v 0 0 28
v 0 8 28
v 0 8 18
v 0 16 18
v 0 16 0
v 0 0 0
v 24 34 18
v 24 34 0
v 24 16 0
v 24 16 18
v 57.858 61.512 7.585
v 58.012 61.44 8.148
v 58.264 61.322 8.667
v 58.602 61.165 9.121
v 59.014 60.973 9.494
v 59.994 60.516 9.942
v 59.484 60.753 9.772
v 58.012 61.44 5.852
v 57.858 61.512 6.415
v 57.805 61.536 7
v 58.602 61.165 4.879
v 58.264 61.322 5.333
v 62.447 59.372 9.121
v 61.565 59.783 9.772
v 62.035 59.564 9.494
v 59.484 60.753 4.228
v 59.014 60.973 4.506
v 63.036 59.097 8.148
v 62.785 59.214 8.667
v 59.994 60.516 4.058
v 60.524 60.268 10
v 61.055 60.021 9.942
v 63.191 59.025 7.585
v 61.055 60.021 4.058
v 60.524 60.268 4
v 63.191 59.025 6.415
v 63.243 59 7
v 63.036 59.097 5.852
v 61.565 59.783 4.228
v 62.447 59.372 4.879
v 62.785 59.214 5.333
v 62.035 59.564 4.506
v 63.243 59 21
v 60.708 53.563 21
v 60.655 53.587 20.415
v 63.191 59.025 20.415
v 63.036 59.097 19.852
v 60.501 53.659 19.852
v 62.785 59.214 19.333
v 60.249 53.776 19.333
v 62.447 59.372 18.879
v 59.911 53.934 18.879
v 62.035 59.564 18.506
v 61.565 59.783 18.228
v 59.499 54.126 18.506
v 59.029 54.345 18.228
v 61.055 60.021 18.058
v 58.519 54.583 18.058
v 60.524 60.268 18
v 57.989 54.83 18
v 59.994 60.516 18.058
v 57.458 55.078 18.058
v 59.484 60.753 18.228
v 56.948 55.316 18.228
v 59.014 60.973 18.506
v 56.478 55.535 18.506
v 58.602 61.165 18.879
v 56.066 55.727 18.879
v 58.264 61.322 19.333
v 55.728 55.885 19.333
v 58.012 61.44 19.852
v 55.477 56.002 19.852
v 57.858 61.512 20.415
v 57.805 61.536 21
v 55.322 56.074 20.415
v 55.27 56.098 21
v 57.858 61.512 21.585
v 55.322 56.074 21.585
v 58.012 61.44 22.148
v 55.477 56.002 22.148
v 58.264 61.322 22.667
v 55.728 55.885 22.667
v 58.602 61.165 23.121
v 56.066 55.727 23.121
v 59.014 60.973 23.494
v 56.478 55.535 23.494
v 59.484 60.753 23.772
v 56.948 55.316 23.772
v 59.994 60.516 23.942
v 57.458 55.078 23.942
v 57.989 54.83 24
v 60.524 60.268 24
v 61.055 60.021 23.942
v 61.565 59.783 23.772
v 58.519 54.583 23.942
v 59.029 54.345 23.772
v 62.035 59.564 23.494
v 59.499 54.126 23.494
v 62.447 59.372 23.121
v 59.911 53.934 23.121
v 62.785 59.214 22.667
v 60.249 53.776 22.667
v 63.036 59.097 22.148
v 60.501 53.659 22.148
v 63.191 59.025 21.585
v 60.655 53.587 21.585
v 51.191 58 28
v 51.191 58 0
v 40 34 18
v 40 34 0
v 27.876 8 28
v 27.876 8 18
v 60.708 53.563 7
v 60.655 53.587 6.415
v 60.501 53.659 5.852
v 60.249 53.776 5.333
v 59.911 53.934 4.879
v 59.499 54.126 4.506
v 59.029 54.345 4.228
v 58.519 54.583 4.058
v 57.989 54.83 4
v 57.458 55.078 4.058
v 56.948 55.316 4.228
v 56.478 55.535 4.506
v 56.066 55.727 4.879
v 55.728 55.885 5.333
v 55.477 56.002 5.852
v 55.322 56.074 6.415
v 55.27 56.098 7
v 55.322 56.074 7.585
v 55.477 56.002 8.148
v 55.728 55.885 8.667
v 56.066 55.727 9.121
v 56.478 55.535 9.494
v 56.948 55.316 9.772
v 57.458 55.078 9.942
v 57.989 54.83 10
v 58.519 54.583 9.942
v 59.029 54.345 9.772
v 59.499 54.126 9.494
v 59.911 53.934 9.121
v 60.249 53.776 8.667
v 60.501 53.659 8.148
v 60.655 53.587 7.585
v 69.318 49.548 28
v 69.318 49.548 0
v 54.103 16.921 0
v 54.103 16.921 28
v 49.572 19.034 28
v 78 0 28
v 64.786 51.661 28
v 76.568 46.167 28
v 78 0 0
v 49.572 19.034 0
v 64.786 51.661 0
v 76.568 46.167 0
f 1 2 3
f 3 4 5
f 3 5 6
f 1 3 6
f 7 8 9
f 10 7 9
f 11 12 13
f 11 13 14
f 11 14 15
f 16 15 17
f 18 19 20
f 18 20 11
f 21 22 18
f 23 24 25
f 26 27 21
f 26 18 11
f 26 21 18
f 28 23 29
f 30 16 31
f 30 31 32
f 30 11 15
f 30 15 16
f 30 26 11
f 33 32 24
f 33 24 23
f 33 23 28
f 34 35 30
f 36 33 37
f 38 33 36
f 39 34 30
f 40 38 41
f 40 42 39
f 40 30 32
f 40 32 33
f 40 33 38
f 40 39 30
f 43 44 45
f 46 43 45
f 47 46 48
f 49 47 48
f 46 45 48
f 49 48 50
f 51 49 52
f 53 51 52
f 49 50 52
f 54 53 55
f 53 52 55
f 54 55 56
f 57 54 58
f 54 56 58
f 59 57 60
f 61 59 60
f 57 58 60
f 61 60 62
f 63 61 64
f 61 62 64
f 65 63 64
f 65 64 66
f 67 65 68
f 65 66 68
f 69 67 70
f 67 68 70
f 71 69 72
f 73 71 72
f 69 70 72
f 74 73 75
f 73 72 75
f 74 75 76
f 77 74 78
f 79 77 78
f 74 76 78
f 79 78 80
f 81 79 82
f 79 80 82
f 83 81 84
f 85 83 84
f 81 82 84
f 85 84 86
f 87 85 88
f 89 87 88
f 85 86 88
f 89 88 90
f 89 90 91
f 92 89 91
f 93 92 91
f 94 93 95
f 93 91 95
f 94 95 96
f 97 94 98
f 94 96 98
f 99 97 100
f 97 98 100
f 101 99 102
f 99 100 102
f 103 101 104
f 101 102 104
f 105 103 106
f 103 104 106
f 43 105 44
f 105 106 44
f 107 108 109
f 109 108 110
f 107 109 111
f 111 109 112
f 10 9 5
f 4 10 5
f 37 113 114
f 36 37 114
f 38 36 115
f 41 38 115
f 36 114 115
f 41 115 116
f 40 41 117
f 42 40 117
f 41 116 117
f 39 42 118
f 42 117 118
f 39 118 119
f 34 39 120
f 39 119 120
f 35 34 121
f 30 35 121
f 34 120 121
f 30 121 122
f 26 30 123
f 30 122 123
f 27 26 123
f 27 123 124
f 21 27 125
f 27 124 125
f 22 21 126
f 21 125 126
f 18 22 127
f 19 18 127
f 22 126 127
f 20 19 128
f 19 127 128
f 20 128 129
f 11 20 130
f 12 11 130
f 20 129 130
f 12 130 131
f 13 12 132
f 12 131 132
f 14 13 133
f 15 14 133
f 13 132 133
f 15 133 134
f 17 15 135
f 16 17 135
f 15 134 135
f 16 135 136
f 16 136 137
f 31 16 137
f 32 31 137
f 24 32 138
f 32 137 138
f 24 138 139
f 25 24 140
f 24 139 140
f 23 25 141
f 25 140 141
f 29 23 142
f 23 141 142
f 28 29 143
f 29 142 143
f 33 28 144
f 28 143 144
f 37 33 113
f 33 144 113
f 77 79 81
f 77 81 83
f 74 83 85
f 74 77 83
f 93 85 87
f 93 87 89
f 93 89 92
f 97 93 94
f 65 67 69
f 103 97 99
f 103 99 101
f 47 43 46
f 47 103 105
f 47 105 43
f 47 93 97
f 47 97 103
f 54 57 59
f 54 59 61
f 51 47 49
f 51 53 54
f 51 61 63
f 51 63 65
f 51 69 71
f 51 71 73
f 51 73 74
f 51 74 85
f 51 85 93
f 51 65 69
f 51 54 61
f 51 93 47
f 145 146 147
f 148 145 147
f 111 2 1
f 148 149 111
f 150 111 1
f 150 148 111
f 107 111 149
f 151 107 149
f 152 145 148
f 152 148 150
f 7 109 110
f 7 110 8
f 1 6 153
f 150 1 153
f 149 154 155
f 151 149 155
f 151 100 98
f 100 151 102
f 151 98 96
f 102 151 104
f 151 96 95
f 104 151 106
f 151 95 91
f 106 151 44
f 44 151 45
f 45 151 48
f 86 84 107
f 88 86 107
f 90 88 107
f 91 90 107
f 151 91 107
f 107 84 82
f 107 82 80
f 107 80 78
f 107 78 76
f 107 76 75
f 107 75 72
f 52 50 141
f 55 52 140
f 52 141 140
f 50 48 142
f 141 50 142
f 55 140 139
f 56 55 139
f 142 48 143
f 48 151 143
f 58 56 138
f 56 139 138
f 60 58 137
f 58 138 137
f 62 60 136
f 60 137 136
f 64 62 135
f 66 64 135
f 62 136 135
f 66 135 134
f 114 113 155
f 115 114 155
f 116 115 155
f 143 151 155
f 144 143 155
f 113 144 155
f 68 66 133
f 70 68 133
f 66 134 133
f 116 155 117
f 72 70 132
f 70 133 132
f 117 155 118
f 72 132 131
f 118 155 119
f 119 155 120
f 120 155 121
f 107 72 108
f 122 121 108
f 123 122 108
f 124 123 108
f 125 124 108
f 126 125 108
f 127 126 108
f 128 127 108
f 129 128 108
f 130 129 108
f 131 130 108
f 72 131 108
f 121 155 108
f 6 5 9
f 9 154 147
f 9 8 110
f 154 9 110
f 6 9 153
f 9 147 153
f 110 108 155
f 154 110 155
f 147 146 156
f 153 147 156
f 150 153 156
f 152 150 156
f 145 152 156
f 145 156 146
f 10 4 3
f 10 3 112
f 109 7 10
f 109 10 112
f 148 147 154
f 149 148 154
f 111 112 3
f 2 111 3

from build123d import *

# Parameters (mm, degrees)
BOSS_EXTRUDE1_DEPTH = 28
BOSS_EXTRUDE2_DEPTH = 18
SKETCH2_R           = 3
BOSS_EXTRUDE3_DEPTH = 6


with BuildPart() as part:
    # Sketch1 → Boss-Extrude1 (new body)
    with BuildSketch(Plane.XY):
        Polygon((0, 0), (78, 0), (76.568001833, 46.166688671), (69.317539536, 49.547634765), (54.103282114, 16.920554432), (49.571743179, 19.033645741), (64.786000601, 51.660726074), (51.191383796, 58), (27.876000888, 8), (0, 8), align=None)
    extrude(amount=BOSS_EXTRUDE1_DEPTH)

    # Sketch1<3> → Boss-Extrude2 (add)
    with BuildSketch(Plane.XY):
        Polygon((0, 16), (0, 8), (27.876000888, 8), (40, 34), (24, 34), (24, 16), align=None)
    extrude(amount=BOSS_EXTRUDE2_DEPTH)

    # Sketch2 → Boss-Extrude3 (add)
    with BuildSketch(Plane(origin=(31.358387135, 67.248278227, 0), x_dir=(0.9063077870366482, -0.4226182617407034, 0), z_dir=(0.4226182617407034, 0.9063077870366482, 0))):
        with Locations((29.383290582, -7)):
            Circle(SKETCH2_R)
        with Locations((29.383290582, -21)):
            Circle(SKETCH2_R)
    extrude(amount=BOSS_EXTRUDE3_DEPTH)


solid = part.part
